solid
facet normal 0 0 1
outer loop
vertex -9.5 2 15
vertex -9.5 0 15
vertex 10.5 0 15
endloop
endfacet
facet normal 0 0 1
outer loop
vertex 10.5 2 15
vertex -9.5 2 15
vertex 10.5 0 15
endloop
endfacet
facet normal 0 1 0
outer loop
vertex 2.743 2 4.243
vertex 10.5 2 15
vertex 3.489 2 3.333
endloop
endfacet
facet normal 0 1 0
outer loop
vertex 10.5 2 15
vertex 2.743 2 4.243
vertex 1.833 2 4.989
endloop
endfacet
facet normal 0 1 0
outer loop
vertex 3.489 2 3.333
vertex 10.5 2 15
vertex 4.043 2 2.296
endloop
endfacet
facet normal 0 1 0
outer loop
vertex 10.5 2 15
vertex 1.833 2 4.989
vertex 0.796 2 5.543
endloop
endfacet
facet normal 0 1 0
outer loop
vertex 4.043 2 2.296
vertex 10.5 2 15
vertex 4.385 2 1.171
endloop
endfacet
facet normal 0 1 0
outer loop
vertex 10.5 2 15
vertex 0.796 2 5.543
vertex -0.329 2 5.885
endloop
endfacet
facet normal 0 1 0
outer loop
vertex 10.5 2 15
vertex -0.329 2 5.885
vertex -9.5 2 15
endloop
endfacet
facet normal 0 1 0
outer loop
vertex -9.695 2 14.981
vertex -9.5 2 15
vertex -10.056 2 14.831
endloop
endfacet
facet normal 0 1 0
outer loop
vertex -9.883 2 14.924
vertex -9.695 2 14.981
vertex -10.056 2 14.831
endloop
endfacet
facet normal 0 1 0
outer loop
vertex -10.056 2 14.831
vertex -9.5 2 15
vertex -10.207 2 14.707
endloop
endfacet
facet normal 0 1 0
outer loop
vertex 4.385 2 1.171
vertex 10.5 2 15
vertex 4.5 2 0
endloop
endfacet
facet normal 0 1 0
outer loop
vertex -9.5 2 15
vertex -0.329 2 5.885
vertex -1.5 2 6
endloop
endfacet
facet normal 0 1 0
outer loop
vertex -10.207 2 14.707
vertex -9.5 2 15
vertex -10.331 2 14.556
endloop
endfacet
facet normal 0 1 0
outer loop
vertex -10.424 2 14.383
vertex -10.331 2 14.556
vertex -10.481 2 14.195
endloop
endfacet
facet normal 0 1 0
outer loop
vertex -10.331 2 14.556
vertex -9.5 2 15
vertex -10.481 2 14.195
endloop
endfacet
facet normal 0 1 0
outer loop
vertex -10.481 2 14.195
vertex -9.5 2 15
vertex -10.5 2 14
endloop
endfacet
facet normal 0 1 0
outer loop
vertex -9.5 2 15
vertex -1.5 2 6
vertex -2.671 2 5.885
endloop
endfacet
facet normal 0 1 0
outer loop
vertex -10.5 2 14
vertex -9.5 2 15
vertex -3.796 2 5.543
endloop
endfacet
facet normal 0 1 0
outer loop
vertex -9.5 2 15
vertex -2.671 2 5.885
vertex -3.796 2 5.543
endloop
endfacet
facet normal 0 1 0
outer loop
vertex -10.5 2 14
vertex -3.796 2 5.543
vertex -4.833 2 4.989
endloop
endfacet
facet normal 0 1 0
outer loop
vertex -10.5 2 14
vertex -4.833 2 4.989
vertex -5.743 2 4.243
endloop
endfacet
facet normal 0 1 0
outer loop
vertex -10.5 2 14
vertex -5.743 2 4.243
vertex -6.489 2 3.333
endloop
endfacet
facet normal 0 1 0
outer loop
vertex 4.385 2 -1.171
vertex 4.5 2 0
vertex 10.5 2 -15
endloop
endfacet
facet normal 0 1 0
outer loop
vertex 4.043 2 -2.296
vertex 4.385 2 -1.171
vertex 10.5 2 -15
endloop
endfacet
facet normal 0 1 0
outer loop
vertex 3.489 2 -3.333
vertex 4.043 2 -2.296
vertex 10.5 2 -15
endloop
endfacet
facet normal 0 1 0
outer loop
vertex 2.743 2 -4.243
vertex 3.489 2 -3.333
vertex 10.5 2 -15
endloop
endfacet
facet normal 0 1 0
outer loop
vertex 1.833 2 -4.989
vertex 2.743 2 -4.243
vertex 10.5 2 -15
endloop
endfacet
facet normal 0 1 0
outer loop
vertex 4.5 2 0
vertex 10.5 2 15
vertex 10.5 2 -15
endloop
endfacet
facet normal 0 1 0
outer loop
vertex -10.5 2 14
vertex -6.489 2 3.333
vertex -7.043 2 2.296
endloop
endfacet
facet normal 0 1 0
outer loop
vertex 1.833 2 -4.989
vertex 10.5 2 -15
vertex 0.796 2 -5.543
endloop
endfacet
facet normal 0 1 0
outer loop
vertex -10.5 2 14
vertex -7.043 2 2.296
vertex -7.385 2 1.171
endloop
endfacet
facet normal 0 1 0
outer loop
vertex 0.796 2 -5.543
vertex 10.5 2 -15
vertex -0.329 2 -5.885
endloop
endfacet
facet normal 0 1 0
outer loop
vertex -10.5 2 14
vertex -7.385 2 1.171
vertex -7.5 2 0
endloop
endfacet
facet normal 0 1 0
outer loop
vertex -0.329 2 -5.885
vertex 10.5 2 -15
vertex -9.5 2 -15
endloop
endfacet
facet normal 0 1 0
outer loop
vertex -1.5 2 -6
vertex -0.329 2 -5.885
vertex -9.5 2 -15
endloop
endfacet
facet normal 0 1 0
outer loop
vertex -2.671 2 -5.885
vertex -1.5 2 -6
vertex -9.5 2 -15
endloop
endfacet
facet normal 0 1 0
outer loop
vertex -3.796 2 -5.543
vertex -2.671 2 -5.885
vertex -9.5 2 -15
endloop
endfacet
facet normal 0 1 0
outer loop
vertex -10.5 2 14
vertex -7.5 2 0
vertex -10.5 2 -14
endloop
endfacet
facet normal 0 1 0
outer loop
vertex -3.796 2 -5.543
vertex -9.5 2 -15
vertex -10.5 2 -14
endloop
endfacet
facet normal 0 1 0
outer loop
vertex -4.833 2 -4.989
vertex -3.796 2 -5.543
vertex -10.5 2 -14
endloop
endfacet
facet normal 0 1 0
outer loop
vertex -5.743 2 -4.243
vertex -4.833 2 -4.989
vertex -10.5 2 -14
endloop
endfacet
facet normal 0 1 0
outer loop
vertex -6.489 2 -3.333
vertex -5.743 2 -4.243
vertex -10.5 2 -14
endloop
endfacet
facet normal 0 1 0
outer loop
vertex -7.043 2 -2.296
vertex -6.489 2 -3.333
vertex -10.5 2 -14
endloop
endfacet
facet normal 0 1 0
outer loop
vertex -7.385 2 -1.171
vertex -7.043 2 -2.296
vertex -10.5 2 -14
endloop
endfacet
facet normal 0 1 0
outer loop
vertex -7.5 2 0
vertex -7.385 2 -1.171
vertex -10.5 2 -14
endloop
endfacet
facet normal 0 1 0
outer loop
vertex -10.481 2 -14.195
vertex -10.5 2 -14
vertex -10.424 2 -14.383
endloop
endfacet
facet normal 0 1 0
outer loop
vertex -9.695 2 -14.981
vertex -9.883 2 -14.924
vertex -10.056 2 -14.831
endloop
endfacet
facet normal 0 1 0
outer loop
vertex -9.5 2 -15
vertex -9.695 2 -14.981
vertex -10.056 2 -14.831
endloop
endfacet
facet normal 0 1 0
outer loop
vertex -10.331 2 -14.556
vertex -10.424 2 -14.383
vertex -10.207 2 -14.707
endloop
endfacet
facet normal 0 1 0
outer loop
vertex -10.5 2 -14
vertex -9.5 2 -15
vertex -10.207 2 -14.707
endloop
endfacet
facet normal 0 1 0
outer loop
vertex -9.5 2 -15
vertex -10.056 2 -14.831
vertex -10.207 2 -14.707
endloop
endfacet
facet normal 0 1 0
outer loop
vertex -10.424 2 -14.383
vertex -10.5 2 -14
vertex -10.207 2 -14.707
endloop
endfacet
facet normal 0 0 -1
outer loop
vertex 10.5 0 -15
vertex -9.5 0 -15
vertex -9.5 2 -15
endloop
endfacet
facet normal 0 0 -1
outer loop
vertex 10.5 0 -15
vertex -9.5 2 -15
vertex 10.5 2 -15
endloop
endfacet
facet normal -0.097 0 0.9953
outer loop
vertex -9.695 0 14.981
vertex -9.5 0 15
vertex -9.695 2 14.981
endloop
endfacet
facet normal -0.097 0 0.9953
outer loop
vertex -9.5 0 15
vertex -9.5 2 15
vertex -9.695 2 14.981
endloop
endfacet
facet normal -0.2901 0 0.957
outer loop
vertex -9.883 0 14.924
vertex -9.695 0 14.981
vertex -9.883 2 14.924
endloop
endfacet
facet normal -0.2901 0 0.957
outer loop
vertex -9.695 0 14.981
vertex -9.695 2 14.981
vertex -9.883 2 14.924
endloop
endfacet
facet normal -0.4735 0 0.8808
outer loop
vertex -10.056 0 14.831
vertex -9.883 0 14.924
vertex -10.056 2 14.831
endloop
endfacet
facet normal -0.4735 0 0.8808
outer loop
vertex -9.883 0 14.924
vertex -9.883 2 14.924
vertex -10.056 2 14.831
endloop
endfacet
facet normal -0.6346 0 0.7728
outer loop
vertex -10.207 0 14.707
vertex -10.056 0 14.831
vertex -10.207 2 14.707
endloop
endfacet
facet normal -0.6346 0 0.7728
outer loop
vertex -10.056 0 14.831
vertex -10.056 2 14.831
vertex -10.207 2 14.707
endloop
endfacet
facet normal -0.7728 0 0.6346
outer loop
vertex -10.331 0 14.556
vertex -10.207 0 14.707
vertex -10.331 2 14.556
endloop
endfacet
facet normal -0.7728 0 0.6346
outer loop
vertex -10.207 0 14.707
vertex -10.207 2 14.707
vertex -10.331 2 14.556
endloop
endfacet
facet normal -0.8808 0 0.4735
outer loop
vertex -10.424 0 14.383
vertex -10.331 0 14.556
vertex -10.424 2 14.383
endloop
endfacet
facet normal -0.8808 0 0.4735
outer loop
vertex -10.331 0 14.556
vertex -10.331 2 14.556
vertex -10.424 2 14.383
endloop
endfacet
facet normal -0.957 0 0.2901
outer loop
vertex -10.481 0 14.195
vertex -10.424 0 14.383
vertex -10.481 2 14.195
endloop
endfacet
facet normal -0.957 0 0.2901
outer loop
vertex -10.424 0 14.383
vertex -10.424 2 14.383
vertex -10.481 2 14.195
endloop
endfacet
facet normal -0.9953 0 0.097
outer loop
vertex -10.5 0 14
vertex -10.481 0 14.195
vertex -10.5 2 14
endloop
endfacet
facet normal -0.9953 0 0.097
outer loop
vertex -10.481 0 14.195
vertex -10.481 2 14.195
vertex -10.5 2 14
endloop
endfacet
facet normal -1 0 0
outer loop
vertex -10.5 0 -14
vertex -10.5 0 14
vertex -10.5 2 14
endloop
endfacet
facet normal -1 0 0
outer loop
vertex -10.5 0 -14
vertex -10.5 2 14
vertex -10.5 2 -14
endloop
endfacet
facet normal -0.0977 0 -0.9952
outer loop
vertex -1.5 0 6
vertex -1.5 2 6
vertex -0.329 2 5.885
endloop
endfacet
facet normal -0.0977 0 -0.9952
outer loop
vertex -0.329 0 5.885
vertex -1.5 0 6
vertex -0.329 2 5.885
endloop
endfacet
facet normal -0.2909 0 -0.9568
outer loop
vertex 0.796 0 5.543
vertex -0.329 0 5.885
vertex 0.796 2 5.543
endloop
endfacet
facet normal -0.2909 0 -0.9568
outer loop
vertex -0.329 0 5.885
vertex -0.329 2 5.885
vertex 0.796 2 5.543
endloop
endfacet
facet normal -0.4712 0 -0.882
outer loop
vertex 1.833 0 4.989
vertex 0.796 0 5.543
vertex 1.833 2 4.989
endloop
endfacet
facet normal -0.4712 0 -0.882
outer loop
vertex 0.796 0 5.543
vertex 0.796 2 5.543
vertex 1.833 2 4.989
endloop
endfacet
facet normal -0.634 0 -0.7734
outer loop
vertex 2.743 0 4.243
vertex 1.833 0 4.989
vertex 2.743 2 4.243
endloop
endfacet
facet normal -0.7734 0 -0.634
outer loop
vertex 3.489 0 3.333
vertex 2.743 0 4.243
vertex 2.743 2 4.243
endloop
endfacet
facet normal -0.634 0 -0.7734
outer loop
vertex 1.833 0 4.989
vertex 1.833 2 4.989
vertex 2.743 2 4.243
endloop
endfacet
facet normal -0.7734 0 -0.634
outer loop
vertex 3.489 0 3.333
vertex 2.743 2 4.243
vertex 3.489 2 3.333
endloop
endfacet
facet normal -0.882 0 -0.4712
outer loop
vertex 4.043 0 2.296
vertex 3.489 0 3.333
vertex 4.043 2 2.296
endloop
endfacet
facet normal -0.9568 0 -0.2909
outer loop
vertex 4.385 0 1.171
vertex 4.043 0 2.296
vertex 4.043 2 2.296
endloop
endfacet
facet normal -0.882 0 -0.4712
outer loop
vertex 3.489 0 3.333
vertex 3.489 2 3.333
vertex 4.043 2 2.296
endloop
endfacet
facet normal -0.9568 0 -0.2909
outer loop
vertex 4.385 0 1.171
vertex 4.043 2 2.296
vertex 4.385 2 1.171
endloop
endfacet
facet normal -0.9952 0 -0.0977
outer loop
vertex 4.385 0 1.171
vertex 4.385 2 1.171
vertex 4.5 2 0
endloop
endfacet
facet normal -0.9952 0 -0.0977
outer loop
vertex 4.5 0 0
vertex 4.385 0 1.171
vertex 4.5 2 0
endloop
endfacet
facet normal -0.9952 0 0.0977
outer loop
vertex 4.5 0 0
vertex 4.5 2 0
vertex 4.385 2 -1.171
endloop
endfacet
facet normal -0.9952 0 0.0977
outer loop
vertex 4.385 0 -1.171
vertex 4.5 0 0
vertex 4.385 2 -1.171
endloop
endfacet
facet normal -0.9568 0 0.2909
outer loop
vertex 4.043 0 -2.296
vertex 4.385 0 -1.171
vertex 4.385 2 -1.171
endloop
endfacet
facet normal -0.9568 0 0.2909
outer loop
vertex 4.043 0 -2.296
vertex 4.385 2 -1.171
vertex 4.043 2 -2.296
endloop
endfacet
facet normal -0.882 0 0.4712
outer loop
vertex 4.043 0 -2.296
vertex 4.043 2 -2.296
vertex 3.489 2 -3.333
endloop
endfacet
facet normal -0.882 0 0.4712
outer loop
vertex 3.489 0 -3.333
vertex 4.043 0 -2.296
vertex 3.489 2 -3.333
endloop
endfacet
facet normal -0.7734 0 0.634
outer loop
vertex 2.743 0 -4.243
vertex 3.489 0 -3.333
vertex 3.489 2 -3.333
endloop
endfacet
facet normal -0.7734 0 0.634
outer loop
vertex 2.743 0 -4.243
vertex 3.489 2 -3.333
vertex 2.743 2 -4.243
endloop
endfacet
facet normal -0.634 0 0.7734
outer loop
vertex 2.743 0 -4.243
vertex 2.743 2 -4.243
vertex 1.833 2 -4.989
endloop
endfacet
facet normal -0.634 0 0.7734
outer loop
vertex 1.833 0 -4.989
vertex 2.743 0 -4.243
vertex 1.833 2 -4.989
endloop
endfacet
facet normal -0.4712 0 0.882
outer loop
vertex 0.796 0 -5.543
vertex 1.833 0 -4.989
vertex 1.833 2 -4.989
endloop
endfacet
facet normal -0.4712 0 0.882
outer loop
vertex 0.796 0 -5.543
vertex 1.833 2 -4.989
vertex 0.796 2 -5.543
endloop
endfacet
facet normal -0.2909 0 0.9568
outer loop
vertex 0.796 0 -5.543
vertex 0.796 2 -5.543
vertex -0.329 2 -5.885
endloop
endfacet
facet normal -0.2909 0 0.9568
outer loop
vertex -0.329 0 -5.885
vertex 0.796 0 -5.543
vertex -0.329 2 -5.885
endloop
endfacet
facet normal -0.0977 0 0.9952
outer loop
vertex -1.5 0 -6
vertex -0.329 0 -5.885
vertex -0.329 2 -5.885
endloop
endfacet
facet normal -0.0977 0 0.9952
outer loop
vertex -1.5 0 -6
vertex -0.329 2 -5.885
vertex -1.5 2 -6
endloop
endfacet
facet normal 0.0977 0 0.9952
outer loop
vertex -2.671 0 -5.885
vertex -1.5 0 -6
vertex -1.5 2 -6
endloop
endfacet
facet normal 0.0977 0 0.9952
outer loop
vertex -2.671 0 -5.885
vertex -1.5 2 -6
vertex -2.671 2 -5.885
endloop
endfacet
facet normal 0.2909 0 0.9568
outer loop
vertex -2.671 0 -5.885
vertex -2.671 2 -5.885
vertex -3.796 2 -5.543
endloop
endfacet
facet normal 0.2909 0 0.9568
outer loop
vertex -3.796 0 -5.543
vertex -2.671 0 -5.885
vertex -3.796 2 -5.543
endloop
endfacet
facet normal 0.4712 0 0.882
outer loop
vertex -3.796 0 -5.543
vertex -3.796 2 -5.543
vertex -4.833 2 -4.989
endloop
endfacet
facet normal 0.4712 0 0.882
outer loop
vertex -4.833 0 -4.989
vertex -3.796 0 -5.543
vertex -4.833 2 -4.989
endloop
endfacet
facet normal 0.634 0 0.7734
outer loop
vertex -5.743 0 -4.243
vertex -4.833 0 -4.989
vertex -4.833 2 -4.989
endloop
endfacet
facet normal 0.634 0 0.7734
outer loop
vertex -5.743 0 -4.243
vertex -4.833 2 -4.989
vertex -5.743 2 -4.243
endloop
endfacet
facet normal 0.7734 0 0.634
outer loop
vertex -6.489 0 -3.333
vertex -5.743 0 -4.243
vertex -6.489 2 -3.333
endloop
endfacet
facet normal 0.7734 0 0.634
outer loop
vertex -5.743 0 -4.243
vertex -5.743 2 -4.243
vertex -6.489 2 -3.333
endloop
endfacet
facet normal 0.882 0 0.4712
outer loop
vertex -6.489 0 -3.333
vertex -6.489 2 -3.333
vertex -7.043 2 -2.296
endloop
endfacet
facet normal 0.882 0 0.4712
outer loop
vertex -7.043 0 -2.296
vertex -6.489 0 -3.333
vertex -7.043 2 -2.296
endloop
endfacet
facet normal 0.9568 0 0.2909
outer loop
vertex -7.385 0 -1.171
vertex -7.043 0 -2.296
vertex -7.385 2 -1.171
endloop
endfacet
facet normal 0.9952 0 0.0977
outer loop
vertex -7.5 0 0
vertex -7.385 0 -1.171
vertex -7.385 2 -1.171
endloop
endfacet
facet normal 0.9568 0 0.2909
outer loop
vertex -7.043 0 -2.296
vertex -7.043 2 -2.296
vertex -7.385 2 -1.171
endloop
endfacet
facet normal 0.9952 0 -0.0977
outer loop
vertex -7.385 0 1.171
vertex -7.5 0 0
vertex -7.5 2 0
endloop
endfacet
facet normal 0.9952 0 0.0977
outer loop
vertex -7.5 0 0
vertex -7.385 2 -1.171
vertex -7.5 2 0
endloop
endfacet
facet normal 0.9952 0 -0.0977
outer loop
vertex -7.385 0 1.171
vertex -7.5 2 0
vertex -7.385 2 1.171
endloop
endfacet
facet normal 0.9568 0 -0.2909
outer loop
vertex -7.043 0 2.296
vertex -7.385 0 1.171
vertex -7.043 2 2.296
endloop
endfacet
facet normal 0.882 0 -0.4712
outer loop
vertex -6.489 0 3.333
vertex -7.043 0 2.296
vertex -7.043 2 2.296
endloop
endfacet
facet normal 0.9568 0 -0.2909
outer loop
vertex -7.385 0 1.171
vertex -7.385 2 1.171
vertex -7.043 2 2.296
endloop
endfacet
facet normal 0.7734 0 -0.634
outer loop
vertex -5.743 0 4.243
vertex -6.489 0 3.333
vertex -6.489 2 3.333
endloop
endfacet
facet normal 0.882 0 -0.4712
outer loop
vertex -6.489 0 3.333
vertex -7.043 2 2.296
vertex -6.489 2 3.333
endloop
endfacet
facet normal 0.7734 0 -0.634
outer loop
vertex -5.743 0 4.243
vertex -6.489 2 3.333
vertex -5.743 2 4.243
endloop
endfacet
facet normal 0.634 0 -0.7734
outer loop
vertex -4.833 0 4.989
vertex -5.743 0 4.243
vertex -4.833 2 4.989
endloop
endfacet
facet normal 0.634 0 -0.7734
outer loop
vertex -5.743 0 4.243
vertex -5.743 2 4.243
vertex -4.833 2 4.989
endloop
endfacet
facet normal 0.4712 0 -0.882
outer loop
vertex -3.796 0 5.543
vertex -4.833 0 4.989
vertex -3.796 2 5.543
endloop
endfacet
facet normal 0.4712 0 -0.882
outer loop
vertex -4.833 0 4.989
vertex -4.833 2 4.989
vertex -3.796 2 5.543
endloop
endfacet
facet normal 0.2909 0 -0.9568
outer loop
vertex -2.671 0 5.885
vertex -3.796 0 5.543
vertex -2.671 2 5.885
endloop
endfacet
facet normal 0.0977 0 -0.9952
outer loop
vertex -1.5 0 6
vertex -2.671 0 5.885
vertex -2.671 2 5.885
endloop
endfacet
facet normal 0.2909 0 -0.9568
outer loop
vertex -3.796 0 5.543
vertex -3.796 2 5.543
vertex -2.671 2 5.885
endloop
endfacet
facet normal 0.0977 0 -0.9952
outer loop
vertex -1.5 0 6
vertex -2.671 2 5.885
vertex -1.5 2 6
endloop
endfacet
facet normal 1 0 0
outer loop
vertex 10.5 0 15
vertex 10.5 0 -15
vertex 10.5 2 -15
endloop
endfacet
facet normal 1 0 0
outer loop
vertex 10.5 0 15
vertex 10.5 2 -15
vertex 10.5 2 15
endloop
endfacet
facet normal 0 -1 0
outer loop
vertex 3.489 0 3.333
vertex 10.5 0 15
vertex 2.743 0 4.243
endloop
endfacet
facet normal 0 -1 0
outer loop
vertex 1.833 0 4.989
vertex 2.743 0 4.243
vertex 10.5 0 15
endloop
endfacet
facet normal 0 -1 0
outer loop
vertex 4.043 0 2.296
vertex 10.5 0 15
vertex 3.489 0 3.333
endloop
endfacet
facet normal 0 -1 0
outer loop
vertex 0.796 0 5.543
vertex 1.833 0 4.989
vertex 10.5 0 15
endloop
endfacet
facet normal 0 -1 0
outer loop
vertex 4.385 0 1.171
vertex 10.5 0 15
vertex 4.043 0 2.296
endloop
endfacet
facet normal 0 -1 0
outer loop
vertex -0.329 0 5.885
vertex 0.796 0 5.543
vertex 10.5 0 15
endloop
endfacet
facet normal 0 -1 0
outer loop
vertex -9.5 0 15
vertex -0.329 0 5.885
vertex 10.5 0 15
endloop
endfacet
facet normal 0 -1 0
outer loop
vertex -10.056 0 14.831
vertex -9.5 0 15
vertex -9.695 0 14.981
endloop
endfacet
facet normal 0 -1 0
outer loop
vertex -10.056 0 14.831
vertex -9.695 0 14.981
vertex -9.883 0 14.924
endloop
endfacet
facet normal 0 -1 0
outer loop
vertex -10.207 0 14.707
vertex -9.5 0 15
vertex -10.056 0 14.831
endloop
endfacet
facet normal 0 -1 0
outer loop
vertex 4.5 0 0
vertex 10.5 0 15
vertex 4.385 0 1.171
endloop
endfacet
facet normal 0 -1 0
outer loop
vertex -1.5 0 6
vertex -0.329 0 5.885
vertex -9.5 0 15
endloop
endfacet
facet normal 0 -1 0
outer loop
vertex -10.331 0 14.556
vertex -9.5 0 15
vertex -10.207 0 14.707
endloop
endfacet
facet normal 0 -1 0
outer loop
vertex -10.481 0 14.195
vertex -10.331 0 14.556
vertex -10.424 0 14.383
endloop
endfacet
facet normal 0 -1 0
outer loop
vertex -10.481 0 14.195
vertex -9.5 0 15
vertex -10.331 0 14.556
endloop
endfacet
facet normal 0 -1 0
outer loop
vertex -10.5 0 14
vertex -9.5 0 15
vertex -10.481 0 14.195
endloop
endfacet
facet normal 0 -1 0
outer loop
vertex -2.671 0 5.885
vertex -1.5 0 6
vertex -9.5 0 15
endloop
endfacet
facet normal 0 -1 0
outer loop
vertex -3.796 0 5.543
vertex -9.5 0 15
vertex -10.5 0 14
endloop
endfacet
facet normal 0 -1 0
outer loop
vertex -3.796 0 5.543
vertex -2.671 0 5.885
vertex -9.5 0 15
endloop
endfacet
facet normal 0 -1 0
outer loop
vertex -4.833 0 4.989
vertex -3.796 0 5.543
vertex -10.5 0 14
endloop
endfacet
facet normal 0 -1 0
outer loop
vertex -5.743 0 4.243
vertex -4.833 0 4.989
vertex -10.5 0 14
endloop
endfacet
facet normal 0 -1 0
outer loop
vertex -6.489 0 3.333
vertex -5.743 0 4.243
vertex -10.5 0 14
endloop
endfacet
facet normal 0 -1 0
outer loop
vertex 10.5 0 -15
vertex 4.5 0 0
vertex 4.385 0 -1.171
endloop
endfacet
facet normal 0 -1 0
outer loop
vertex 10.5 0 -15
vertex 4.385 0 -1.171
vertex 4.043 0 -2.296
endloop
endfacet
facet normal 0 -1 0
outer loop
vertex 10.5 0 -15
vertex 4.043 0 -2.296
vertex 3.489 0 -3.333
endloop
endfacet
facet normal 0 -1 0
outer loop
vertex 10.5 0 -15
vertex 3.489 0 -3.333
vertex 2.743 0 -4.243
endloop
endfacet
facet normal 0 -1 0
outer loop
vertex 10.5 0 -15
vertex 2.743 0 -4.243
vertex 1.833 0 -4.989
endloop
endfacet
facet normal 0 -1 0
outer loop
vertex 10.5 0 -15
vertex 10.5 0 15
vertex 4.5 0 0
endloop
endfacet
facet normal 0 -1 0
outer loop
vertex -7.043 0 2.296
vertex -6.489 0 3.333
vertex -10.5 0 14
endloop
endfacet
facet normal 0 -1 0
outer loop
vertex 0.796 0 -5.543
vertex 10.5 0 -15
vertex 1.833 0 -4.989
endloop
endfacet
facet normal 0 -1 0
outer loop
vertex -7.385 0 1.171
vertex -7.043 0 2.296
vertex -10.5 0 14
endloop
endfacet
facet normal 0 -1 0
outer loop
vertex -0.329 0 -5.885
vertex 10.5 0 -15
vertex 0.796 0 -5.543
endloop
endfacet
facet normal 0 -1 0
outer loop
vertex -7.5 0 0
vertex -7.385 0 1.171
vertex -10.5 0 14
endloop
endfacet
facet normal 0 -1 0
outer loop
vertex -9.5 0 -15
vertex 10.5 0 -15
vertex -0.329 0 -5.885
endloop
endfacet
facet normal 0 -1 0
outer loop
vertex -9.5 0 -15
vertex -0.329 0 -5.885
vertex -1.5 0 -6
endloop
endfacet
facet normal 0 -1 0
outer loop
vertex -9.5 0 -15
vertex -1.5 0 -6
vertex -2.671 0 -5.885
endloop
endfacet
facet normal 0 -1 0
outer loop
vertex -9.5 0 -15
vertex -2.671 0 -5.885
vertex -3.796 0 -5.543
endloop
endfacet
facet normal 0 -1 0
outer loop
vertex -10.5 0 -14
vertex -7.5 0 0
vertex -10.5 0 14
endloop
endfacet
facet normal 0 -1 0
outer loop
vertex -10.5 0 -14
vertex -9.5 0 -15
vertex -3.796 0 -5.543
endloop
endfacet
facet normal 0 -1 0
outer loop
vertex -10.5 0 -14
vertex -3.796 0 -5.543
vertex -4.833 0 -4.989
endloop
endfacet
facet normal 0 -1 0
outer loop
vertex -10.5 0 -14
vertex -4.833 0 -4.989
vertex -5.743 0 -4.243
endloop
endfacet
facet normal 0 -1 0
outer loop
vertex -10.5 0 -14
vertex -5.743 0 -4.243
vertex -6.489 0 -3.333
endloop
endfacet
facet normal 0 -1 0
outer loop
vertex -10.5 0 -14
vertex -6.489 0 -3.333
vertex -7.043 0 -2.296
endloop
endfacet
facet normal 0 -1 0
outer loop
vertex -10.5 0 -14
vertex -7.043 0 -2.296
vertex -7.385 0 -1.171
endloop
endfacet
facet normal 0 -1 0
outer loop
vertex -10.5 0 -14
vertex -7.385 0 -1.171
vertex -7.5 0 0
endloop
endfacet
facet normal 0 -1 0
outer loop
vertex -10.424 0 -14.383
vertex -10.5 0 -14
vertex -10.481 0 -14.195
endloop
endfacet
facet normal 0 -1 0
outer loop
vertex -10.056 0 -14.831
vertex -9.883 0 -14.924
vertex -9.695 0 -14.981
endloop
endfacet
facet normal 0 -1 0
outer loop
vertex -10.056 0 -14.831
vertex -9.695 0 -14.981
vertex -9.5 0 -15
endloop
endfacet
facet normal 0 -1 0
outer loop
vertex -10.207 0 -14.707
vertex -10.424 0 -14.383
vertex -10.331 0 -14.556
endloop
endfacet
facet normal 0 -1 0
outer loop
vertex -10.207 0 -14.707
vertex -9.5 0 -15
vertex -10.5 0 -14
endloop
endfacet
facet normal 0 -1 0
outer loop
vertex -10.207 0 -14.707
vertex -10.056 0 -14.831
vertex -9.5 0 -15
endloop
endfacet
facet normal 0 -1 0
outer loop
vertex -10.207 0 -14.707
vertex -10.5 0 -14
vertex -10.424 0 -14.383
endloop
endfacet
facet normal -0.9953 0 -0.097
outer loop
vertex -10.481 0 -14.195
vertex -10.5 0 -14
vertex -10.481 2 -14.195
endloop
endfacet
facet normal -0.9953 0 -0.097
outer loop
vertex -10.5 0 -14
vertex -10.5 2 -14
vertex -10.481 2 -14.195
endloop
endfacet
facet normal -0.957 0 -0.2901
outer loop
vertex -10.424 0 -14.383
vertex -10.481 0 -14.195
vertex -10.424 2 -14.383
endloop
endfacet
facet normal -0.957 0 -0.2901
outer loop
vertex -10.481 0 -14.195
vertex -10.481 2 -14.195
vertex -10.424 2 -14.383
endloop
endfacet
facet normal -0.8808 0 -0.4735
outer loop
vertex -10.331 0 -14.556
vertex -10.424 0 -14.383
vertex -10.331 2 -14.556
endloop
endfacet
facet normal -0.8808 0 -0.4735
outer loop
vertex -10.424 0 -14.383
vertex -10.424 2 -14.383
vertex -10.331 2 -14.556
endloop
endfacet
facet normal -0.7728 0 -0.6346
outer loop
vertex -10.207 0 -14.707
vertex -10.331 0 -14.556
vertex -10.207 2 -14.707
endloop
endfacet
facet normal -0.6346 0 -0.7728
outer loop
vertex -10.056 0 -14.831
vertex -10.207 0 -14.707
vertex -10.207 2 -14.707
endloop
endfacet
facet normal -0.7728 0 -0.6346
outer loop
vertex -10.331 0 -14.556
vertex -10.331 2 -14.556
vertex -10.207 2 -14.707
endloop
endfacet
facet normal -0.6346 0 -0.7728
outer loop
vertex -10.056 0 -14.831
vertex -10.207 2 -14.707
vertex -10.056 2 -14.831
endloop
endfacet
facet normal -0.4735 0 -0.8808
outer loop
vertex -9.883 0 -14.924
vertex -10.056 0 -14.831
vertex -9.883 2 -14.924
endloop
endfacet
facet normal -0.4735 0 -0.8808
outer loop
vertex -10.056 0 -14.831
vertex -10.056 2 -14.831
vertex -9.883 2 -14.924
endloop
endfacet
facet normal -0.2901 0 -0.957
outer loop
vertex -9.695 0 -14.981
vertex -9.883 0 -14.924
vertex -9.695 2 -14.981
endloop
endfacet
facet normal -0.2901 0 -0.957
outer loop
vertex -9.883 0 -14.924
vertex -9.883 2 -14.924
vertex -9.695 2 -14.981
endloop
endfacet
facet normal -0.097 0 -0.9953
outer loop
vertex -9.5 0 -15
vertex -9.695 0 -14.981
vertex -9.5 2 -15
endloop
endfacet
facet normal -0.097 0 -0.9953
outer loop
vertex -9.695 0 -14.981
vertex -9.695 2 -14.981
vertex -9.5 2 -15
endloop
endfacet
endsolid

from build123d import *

# Parameters (mm, degrees)
BOSS_EXTRUDE1_DEPTH = 2
FILLET1_R           = 1
SKETCH2_R           = 6
CUT_EXTRUDE1_DEPTH  = 19.418740456


with BuildPart() as part:
    # Sketch1 → Boss-Extrude1 (new body)
    with BuildSketch(Plane(origin=(0, 0, 0), x_dir=(1, 0, 0), z_dir=(0, 1, 0))):
        Polygon((0, -15), (-10.5, -15), (-10.5, 15), (10.5, 15), (10.5, -15), align=None)
    extrude(amount=BOSS_EXTRUDE1_DEPTH)

    # Fillet1
    fillet1_edges = [part.edges().sort_by_distance(p)[0] for p in [
        (-10.5, 1, 15),
        (-10.5, 1, -15),
    ]]
    fillet(fillet1_edges, radius=FILLET1_R)

    # Sketch2 → Cut-Extrude1 (cut, through all)
    with BuildSketch(Plane(origin=(0, 2, 0), x_dir=(1, 0, 0), z_dir=(0, 1, 0))):
        with Locations(Location((-1.5, 0, 0), (0, 0, 270))):
            Circle(SKETCH2_R)
    extrude(amount=-CUT_EXTRUDE1_DEPTH, mode=Mode.SUBTRACT)


solid = part.part
